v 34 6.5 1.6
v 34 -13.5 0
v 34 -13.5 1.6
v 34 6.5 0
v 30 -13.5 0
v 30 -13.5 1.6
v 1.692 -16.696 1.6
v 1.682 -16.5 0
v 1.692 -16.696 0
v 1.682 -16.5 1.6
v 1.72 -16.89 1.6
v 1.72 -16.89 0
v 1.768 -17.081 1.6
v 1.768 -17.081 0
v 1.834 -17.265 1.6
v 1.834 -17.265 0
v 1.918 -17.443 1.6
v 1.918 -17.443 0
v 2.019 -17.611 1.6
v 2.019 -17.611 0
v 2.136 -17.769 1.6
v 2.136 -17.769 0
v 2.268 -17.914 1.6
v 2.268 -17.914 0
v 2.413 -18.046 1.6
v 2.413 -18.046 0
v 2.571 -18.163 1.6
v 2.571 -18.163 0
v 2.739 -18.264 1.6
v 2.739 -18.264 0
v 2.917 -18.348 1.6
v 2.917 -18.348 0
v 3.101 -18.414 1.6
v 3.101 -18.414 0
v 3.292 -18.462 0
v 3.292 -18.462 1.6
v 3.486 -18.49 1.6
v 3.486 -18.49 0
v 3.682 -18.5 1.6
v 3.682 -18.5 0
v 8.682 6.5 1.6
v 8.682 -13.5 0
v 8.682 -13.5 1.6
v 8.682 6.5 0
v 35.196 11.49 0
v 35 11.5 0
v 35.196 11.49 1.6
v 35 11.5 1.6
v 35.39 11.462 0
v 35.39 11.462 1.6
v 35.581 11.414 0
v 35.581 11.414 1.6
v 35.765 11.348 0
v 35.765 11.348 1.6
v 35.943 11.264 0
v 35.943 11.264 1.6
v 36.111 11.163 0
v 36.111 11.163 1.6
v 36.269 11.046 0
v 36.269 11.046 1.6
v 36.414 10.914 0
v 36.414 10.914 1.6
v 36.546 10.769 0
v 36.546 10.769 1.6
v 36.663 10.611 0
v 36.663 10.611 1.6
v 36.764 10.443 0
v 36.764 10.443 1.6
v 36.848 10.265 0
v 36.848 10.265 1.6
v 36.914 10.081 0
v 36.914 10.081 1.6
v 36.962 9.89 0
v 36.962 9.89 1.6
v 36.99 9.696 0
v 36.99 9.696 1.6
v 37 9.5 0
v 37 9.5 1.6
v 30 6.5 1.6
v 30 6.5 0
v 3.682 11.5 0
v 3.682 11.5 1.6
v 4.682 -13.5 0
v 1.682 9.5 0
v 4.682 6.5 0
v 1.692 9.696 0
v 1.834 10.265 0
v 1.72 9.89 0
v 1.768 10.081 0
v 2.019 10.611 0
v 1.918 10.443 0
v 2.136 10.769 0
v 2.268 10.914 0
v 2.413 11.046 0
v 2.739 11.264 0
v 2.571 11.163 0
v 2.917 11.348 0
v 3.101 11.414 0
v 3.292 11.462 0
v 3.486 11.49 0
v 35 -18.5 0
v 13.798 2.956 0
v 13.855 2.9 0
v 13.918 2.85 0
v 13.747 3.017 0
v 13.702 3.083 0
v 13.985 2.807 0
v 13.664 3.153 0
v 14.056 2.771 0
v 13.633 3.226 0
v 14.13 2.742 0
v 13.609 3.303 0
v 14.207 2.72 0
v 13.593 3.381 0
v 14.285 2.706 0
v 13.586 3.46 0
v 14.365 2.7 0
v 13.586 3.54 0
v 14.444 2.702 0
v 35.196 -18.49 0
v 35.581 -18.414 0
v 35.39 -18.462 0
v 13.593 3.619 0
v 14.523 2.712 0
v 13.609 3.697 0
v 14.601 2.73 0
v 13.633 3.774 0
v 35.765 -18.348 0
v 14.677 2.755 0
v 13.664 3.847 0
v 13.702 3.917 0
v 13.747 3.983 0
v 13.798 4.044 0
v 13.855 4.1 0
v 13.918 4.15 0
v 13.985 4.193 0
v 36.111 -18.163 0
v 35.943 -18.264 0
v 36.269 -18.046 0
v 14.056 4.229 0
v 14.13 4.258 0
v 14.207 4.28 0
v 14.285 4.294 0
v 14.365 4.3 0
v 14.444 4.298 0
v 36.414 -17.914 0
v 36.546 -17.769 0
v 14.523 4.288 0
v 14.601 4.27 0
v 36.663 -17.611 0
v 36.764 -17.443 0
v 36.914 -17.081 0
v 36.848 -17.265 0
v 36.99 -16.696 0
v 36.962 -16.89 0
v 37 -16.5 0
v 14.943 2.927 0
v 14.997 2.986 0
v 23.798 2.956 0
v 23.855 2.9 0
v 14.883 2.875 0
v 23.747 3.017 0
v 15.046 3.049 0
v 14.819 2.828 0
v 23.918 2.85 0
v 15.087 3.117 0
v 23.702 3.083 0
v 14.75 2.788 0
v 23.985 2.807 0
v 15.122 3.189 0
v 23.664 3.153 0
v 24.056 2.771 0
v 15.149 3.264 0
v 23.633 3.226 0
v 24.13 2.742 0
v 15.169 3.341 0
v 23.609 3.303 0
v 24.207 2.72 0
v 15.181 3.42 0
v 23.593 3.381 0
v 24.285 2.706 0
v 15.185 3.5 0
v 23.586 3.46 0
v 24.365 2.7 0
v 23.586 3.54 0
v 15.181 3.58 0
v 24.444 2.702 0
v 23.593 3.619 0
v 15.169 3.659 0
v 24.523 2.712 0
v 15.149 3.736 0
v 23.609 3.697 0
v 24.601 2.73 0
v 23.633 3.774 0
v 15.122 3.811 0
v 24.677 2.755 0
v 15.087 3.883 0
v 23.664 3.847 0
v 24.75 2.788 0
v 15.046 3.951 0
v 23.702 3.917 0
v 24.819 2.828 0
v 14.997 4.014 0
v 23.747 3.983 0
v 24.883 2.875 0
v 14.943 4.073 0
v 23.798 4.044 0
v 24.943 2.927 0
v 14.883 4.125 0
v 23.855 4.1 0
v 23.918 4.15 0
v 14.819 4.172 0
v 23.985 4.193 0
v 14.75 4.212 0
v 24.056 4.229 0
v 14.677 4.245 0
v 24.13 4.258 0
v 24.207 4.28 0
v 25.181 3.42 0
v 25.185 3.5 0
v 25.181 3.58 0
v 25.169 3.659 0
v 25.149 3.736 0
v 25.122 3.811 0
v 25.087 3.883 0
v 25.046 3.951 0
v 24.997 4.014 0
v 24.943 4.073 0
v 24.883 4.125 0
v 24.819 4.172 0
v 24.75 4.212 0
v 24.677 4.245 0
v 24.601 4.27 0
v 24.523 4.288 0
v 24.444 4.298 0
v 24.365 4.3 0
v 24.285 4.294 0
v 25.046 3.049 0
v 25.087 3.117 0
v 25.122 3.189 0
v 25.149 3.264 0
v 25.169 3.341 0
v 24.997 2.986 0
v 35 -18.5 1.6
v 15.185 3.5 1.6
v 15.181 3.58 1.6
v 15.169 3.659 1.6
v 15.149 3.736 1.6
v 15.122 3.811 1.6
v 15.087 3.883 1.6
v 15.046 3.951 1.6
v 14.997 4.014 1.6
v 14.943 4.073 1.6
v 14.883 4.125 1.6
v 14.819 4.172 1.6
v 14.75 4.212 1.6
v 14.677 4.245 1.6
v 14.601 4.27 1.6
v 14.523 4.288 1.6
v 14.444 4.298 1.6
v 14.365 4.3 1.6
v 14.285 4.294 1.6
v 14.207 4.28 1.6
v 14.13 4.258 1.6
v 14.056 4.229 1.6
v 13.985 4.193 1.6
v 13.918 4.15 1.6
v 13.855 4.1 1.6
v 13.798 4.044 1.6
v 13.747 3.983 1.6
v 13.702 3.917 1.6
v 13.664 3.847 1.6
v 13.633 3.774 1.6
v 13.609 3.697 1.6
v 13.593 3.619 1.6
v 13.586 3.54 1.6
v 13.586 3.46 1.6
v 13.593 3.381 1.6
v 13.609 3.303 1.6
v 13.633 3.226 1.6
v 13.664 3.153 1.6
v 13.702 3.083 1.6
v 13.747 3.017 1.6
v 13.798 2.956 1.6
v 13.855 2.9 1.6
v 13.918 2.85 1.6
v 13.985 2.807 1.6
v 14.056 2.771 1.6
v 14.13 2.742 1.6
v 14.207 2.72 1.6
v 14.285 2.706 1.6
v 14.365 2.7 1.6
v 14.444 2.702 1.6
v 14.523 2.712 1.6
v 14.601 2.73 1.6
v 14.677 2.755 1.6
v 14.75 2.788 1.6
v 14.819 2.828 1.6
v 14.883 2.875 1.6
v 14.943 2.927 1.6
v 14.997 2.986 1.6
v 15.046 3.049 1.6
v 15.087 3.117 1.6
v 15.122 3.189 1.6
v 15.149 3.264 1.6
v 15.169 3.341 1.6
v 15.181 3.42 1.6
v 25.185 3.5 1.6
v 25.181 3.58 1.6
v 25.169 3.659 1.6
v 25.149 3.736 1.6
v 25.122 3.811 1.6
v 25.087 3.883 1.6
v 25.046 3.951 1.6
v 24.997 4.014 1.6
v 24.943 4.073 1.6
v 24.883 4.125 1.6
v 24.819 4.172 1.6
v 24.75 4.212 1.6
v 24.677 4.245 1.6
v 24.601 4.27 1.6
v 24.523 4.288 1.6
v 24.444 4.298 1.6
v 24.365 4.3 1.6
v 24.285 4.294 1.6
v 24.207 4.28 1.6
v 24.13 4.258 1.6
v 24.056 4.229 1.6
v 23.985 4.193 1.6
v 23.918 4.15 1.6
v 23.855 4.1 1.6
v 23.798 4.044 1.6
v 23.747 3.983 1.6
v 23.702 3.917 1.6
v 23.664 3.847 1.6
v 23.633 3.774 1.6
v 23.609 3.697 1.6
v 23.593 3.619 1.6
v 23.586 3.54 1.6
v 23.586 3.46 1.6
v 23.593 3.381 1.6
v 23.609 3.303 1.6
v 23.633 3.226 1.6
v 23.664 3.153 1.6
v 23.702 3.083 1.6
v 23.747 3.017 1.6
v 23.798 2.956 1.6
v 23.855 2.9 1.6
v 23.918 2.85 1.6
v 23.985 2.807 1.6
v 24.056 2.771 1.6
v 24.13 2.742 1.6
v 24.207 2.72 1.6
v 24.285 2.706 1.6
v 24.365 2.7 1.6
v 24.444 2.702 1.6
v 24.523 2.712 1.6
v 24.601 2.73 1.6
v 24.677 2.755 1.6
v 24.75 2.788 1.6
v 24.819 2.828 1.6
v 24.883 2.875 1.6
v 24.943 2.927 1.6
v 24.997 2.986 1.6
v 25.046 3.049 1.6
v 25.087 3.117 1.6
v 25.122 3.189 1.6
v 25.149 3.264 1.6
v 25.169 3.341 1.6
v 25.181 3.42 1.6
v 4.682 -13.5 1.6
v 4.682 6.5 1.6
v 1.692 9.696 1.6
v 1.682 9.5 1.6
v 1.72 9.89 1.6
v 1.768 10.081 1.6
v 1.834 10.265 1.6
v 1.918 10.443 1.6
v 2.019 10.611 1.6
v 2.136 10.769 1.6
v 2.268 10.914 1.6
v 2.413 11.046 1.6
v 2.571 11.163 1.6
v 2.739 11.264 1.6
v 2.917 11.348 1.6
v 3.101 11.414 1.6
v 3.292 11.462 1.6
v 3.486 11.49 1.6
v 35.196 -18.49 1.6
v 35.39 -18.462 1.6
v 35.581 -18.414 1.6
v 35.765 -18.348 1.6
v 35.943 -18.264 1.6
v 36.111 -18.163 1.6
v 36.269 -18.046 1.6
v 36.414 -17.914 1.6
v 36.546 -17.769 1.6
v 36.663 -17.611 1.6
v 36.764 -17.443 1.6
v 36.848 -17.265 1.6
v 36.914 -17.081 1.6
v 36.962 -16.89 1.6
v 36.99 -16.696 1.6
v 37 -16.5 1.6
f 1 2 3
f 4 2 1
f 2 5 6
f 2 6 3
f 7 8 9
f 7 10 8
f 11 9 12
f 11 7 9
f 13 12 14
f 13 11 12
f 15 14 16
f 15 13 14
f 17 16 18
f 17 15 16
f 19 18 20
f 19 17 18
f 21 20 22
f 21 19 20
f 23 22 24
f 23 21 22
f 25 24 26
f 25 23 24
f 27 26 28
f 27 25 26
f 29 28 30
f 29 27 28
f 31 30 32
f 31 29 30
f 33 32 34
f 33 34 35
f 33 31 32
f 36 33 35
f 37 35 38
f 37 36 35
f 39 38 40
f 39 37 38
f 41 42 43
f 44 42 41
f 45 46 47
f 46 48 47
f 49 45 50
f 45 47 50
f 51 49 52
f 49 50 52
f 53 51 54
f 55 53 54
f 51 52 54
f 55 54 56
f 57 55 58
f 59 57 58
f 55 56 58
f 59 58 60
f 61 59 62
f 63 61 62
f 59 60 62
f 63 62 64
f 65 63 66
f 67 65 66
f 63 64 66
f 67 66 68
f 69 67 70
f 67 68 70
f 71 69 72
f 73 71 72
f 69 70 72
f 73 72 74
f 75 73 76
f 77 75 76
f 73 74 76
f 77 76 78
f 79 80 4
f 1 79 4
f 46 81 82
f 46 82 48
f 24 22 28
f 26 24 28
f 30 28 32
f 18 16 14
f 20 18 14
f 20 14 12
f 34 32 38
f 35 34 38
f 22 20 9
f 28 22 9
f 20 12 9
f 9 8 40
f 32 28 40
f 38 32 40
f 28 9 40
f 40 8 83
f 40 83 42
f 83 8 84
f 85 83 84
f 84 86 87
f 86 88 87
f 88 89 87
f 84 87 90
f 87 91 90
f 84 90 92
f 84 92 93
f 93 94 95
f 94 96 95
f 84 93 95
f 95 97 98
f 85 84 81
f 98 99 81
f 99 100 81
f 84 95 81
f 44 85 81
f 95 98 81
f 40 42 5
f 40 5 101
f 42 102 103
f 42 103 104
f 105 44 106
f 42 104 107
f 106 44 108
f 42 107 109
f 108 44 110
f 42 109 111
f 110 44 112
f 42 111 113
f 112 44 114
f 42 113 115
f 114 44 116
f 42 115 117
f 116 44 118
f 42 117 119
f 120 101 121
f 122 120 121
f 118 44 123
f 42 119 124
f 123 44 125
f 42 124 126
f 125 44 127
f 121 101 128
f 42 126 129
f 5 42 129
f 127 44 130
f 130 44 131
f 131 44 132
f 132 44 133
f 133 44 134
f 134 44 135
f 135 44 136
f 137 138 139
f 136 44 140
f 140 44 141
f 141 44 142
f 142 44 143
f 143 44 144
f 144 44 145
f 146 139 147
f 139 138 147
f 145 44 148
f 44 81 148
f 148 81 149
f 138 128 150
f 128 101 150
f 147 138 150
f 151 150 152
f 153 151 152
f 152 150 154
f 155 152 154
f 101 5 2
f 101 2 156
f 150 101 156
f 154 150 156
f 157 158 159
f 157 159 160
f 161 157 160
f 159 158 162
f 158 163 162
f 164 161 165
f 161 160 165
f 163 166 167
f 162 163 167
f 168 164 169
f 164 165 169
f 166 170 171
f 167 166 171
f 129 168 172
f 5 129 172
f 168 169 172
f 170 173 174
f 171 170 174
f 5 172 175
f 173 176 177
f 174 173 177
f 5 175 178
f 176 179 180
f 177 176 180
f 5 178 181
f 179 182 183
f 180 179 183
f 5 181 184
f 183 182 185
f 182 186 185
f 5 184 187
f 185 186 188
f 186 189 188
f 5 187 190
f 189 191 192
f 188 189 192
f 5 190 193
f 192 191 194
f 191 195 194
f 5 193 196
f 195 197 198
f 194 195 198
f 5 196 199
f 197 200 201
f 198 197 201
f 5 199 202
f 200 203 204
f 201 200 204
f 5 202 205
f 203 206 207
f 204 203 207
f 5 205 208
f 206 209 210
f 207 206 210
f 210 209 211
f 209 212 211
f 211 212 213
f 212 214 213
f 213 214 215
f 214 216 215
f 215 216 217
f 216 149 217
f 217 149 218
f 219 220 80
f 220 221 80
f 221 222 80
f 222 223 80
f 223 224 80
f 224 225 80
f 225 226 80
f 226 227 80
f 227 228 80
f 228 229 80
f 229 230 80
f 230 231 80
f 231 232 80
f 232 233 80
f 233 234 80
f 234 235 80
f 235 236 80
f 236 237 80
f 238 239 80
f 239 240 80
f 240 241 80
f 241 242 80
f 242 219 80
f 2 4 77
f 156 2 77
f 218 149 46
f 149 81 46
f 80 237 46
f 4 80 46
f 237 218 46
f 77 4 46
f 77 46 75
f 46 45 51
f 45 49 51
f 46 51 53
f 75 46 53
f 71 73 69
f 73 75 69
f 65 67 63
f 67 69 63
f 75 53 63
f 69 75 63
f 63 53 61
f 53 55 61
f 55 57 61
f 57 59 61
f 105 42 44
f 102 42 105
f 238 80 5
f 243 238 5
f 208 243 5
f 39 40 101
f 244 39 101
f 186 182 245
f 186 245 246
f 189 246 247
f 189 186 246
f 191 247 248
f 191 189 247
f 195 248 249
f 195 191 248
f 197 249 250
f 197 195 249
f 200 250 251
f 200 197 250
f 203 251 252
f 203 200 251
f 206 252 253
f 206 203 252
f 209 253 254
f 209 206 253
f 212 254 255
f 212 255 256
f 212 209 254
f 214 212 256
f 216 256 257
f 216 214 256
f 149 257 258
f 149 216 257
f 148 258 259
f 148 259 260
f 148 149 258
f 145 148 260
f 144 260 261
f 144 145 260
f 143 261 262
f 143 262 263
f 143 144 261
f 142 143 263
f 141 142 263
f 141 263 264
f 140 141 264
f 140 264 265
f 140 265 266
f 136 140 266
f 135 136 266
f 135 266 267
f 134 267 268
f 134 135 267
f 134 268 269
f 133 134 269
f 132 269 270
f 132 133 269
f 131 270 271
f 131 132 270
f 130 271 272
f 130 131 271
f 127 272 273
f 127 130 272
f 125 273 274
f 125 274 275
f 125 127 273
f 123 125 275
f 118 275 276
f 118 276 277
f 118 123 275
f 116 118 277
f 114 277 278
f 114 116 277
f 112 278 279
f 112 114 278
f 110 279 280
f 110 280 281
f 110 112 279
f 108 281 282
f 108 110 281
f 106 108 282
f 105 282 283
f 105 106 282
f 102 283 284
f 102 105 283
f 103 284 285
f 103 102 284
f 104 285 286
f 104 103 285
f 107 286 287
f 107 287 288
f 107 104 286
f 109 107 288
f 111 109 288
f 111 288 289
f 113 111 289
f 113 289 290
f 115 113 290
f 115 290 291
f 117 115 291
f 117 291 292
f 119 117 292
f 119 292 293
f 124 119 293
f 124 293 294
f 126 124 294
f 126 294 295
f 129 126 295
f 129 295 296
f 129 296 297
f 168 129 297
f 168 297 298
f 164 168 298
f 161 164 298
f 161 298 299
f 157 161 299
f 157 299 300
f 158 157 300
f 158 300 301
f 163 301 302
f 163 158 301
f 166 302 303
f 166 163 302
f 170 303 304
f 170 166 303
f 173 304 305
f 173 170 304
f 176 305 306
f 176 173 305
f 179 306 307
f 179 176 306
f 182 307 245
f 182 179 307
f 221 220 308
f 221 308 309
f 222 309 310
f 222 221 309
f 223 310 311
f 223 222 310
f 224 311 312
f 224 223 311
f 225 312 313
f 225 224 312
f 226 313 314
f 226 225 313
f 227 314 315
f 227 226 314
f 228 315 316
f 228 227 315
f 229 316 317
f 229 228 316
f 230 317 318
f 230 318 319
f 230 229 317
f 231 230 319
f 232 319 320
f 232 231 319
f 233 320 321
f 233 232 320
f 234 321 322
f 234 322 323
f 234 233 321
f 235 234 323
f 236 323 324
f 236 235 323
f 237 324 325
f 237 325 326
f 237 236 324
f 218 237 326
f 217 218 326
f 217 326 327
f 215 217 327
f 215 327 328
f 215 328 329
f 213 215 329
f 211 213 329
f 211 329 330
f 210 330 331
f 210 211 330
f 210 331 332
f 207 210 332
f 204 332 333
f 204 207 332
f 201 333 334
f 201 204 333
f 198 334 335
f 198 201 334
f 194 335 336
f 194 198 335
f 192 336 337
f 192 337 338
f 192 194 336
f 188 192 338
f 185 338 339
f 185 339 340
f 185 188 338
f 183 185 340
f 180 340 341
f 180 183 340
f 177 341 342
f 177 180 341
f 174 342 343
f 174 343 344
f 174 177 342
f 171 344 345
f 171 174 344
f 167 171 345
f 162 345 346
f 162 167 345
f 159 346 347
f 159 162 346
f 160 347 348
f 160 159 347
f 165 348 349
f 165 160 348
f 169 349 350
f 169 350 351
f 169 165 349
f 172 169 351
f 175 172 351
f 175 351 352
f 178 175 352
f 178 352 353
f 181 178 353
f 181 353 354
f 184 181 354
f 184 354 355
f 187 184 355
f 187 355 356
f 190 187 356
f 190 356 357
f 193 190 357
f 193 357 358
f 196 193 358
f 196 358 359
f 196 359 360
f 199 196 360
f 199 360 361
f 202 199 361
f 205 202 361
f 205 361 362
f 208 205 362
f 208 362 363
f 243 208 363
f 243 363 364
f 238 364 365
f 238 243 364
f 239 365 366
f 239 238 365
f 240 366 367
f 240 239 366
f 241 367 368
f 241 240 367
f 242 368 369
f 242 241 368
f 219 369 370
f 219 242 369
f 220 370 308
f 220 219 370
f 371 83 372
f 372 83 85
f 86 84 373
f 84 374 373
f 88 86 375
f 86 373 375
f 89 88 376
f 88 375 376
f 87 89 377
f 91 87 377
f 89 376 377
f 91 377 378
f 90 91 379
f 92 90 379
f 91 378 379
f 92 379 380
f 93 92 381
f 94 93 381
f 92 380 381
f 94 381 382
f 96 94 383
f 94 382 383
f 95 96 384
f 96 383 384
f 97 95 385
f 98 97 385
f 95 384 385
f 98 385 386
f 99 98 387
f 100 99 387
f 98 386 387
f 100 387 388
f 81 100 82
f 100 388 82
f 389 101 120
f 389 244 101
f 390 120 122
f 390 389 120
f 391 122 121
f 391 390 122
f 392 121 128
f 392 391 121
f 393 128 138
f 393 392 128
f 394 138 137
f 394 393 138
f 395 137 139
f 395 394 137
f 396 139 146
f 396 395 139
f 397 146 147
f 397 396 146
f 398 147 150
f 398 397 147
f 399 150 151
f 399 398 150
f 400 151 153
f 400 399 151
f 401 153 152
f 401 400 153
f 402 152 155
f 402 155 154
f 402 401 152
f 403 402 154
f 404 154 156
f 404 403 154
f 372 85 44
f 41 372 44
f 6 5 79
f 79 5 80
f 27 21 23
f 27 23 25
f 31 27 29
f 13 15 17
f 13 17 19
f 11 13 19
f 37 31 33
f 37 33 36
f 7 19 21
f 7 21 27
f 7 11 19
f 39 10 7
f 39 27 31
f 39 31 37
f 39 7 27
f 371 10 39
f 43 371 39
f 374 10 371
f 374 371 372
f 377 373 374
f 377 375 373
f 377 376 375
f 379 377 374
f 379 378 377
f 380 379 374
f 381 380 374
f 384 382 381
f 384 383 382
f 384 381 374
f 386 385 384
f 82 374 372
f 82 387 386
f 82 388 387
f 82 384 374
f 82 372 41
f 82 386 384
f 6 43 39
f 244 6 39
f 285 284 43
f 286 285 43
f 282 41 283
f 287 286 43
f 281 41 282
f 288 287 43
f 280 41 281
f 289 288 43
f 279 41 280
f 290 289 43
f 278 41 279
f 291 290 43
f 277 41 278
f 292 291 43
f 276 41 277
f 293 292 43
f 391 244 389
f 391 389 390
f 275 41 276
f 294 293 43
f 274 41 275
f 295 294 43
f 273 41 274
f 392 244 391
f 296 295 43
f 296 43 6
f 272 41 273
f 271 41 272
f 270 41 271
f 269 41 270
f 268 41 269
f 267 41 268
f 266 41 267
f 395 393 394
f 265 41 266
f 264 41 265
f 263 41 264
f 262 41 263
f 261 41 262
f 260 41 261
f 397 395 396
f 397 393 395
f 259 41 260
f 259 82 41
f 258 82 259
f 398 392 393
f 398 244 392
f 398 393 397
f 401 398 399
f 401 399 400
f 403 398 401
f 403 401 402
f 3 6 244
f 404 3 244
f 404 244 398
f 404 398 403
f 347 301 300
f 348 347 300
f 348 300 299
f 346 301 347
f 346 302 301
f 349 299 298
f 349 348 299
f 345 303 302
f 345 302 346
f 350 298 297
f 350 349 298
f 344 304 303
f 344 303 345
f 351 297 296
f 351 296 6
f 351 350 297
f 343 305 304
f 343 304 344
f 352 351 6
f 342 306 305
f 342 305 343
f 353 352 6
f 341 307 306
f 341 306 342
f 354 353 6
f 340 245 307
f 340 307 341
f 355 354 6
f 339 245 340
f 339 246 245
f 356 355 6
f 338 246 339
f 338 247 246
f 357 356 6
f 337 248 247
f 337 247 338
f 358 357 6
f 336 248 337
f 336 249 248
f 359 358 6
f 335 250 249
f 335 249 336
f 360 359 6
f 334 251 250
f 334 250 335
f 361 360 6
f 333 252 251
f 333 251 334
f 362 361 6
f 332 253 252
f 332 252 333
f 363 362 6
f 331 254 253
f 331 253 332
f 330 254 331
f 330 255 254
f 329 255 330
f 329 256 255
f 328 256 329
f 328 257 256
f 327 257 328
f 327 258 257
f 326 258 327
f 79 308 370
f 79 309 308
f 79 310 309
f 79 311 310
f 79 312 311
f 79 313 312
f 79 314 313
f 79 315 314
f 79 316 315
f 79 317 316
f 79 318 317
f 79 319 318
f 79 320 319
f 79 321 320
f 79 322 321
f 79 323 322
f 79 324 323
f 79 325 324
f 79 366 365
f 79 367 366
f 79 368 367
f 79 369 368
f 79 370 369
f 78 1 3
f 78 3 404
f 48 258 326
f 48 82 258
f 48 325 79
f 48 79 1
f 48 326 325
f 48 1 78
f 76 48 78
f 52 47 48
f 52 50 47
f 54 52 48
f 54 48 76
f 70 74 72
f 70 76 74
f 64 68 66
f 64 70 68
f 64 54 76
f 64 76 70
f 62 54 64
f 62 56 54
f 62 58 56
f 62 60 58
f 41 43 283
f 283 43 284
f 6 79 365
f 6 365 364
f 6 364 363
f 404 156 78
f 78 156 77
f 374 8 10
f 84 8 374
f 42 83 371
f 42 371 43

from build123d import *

# Parameters (mm, degrees)
SKETCH_1_W      = 35.318125
SKETCH_1_H      = 30
SKETCH_1_R      = 0.8
SKETCH_1_W_2    = 4
SKETCH_1_H_2    = 20
EXTRUDE_1_DEPTH = 1.6
FILLET_1_R      = 2


with BuildPart() as part:
    # 草图1 → 凸台-拉伸1 (new body)
    with BuildSketch(Plane.XY):
        with Locations((19.3409375, -3.5)):
            Rectangle(SKETCH_1_W, SKETCH_1_H)
        with Locations((14.38454248, 3.5)):
            Circle(SKETCH_1_R, mode=Mode.SUBTRACT)
        with Locations((24.38454248, 3.5)):
            Circle(SKETCH_1_R, mode=Mode.SUBTRACT)
        with Locations((6.681875, -3.5)):
            Rectangle(SKETCH_1_W_2, SKETCH_1_H_2, mode=Mode.SUBTRACT)
        with Locations((32, -3.5)):
            Rectangle(SKETCH_1_W_2, SKETCH_1_H_2, mode=Mode.SUBTRACT)
    extrude(amount=EXTRUDE_1_DEPTH)

    # 圆角1
    fillet_1_edges = [part.edges().sort_by_distance(p)[0] for p in [
        (1.681875, 11.5, 0.8),
        (37, 11.5, 0.8),
        (37, -18.5, 0.8),
        (1.681875, -18.5, 0.8),
    ]]
    fillet(fillet_1_edges, radius=FILLET_1_R)


solid = part.part
